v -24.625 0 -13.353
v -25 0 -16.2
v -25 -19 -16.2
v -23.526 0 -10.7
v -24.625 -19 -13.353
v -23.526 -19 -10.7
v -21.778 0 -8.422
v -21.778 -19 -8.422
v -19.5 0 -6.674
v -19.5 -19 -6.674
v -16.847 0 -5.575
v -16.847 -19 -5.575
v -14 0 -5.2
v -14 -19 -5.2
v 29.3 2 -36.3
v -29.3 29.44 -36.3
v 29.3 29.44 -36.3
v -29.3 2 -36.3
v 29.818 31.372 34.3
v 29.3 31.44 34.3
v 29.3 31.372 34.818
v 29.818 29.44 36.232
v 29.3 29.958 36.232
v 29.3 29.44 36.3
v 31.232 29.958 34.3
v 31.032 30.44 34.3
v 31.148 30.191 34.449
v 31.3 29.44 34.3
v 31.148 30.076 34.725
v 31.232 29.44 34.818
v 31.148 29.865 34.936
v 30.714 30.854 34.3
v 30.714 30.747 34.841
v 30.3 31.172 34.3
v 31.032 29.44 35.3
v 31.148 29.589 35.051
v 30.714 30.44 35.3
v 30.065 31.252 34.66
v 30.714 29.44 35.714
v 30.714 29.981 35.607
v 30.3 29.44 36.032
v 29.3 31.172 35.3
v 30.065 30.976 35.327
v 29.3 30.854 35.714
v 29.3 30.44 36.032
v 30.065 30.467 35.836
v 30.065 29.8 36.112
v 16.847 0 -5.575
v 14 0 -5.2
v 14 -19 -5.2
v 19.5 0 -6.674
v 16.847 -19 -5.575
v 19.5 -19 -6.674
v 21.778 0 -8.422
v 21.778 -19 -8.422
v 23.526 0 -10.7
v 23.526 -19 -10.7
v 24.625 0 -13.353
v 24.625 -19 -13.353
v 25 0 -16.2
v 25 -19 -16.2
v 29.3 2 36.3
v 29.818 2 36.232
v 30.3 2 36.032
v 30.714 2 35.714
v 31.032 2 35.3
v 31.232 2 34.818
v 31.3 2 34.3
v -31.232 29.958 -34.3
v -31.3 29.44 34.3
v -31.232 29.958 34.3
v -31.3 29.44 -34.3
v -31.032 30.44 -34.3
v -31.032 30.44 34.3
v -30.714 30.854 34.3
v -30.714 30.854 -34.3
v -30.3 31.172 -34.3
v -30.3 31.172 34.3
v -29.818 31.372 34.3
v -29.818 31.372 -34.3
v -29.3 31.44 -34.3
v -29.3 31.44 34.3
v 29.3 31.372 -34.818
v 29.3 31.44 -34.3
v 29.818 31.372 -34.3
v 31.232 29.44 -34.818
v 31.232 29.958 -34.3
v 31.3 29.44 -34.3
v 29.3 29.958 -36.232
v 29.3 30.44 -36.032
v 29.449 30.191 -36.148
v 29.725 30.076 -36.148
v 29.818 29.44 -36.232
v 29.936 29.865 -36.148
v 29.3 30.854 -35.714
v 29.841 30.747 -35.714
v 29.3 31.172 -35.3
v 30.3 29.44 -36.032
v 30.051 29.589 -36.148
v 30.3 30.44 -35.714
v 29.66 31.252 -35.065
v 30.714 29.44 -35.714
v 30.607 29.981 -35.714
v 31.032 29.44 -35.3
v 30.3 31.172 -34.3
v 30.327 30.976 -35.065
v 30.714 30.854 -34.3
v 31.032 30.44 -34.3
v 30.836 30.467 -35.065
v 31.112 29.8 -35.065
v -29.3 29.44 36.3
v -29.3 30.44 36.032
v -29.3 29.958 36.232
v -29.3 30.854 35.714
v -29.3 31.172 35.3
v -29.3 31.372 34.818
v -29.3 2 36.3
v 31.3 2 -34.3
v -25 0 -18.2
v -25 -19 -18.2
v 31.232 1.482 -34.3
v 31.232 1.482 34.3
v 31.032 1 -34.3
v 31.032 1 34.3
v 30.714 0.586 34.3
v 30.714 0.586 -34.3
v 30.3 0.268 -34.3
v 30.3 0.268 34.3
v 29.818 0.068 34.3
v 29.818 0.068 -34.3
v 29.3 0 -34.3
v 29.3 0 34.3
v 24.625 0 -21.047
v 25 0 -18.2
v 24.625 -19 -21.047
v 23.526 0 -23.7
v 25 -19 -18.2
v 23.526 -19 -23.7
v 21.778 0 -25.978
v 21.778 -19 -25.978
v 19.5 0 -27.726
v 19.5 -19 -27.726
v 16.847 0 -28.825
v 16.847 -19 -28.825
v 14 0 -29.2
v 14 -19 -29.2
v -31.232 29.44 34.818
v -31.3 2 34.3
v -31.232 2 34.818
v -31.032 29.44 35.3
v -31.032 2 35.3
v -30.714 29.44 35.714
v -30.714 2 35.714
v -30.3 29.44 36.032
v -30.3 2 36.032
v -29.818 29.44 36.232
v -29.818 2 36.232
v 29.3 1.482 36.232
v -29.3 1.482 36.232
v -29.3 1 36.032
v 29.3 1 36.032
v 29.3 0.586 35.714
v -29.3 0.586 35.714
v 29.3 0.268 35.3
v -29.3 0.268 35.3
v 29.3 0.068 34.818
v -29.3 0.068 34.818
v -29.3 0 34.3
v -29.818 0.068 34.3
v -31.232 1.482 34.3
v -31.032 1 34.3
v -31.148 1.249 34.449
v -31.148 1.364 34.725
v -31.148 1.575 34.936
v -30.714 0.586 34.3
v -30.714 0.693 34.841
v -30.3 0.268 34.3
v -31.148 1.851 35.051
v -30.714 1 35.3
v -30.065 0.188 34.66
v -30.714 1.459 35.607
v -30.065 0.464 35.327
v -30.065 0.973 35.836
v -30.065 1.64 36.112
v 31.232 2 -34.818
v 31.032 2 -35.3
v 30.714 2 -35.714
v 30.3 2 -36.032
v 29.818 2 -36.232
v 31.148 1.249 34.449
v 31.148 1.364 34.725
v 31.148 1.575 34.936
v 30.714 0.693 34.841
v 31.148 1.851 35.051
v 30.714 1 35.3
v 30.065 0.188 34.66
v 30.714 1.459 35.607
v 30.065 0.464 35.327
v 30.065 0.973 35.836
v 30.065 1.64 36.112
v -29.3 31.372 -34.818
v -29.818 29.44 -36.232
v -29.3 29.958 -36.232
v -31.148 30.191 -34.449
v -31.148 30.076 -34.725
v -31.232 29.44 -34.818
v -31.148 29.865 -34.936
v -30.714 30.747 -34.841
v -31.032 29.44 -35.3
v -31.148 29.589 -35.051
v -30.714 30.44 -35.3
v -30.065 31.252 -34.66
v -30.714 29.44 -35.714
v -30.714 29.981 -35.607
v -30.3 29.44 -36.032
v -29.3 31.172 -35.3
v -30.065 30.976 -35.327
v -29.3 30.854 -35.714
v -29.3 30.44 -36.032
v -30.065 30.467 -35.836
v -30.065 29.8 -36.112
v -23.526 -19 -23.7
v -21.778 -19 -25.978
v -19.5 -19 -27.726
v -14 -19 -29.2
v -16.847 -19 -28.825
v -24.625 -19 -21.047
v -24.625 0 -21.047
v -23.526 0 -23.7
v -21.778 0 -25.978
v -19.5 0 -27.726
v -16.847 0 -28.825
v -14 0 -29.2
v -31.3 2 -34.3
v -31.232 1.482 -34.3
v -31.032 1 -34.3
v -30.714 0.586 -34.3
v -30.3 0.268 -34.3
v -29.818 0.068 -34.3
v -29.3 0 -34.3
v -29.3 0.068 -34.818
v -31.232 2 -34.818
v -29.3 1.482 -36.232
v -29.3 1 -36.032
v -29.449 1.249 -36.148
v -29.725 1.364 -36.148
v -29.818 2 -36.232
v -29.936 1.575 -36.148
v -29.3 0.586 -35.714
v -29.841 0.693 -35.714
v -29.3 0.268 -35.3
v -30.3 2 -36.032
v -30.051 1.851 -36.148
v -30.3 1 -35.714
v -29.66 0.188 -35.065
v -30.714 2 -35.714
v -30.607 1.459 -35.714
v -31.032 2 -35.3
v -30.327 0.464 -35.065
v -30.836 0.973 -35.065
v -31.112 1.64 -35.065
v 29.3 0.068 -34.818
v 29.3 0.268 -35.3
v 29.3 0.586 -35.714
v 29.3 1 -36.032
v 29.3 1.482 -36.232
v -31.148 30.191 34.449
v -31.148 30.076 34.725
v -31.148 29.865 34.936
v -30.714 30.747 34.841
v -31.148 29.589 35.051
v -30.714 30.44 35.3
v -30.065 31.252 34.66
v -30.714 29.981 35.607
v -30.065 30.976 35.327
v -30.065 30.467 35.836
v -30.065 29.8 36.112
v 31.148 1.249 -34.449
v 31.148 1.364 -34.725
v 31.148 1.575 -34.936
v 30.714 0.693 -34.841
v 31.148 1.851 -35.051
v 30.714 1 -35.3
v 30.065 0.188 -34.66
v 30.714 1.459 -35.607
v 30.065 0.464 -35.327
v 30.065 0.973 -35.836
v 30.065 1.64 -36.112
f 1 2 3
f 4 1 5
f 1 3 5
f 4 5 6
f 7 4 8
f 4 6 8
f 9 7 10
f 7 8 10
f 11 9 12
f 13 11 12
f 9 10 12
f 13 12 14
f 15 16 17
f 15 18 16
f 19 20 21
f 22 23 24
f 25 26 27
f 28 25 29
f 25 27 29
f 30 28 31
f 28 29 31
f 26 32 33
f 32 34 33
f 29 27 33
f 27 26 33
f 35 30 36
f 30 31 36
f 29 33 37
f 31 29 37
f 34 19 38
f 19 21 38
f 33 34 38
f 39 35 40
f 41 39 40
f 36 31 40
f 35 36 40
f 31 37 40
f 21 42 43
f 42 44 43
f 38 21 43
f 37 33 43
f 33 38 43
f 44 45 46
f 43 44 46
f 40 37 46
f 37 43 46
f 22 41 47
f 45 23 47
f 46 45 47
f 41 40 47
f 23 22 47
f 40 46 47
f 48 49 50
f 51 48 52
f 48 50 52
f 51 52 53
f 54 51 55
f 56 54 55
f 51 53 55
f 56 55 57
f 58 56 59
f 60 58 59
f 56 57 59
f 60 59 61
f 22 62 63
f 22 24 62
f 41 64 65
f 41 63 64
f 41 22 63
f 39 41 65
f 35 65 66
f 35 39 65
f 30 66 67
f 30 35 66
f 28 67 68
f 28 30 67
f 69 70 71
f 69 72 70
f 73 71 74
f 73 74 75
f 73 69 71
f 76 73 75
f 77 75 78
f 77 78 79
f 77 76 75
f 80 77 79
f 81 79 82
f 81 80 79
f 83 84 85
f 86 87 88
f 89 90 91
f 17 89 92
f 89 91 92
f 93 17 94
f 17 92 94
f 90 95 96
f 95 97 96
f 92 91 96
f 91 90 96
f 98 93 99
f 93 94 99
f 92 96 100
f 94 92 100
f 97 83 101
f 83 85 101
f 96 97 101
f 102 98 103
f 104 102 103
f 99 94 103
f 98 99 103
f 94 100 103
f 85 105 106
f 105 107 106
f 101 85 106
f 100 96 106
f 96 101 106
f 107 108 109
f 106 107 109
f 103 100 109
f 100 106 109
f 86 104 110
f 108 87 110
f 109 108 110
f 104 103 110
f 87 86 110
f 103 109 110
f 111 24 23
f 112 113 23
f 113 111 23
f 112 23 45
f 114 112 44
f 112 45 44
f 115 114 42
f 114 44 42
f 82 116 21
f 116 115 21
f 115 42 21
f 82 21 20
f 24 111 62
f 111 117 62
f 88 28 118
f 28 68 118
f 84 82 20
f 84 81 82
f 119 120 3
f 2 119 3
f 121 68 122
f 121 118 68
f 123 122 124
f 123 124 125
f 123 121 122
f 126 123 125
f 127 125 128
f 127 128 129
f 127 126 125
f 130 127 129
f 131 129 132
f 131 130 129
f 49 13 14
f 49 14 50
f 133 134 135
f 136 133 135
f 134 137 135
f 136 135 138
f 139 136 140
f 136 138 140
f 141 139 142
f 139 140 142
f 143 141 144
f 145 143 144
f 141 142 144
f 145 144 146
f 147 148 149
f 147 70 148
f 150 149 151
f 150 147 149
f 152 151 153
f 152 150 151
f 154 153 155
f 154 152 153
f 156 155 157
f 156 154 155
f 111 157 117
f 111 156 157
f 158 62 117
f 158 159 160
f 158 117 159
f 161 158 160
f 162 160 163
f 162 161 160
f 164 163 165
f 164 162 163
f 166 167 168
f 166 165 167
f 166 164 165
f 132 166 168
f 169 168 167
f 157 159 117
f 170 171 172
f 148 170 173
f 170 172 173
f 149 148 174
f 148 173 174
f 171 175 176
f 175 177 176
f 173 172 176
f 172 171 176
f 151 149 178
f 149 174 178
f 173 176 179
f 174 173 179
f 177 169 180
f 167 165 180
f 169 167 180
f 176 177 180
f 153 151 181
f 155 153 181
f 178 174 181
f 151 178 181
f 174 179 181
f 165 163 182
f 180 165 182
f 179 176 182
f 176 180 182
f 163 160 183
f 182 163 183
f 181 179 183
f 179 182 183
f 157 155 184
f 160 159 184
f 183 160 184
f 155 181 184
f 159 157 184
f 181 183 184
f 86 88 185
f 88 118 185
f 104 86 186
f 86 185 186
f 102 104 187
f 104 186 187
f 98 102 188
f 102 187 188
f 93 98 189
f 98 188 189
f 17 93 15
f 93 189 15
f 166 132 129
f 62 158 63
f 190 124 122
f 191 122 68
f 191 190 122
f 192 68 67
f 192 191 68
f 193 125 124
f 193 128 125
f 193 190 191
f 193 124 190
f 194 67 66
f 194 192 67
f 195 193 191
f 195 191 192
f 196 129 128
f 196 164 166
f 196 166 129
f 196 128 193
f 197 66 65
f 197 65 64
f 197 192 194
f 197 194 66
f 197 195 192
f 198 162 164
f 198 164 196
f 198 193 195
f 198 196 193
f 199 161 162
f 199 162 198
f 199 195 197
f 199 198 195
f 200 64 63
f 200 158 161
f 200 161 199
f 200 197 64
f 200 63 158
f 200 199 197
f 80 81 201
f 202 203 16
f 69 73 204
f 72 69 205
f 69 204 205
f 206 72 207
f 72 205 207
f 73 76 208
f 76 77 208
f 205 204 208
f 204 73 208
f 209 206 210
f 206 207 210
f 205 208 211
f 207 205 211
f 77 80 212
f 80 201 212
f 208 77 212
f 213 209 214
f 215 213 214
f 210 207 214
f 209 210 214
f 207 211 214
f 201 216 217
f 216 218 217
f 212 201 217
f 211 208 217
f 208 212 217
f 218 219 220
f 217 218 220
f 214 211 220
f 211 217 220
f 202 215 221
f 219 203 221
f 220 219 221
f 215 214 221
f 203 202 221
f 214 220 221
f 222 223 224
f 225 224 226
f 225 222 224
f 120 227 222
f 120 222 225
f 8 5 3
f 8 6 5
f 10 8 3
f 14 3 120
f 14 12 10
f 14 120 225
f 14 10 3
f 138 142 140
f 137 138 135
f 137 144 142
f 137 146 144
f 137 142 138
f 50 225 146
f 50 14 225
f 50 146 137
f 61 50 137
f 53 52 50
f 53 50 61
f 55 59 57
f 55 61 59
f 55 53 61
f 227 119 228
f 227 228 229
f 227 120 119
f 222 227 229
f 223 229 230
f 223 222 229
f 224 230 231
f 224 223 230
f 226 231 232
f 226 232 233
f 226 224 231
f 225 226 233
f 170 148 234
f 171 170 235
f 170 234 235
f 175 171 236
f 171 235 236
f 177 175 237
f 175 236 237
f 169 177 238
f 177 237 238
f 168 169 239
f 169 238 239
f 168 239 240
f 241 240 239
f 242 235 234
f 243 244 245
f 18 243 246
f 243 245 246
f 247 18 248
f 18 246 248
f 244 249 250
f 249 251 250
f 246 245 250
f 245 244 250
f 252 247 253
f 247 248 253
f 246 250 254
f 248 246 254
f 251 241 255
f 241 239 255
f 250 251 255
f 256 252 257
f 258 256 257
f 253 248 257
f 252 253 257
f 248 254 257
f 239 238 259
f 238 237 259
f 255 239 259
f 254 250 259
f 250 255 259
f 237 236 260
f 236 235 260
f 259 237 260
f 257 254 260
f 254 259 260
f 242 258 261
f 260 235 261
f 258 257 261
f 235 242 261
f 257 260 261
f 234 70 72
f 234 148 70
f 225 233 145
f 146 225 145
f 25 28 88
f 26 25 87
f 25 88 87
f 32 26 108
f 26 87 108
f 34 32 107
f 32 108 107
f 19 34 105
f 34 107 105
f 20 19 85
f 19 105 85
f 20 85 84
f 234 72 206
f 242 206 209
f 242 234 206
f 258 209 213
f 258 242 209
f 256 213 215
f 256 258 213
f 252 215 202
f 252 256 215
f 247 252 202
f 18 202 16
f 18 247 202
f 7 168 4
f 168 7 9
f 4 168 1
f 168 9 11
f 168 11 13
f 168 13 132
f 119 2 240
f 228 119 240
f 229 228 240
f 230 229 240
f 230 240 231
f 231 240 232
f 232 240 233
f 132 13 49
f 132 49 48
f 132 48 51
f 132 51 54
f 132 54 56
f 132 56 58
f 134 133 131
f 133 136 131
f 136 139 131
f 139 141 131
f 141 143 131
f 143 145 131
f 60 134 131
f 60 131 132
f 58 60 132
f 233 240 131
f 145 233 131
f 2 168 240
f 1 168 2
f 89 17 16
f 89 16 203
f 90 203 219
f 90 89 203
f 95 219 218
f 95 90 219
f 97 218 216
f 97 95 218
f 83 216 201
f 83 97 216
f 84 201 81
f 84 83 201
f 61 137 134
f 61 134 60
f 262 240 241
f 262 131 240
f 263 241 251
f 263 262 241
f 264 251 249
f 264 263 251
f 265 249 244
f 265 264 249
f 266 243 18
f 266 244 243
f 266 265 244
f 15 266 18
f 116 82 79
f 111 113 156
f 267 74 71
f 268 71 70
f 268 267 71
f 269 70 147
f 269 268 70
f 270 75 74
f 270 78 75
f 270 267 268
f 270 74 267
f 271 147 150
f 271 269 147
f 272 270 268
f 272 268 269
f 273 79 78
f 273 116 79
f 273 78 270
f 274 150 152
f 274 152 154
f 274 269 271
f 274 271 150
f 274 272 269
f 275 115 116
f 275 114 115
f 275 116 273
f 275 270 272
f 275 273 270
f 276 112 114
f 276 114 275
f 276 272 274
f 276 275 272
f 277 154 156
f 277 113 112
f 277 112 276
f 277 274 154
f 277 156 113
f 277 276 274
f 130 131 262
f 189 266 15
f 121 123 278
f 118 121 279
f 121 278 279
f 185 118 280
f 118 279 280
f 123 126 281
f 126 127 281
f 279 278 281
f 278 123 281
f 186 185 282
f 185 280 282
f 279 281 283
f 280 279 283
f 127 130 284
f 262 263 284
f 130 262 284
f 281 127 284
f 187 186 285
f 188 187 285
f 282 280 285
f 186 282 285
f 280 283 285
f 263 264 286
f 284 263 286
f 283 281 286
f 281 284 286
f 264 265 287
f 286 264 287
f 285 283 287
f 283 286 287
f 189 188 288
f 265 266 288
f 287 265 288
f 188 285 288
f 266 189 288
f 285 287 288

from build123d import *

# Parameters (mm, degrees)
SKETCH1_W           = 62.6
SKETCH1_H           = 72.6
BOSS_EXTRUDE1_DEPTH = 24.14
SKETCH2_W           = 50
SKETCH2_H           = 24
BOSS_EXTRUDE2_DEPTH = 19
SKETCH3_W           = 62.6
SKETCH3_H           = 72.6
BOSS_EXTRUDE3_DEPTH = 7.3
FILLET1_R           = 2
FILLET2_R           = 11


with BuildPart() as part:
    # Sketch1 → Boss-Extrude1 (new body)
    with BuildSketch(Plane(origin=(0, 0, 0), x_dir=(1, 0, 0), z_dir=(0, 1, 0))):
        Rectangle(SKETCH1_W, SKETCH1_H)
    extrude(amount=BOSS_EXTRUDE1_DEPTH)

    # Sketch2 → Boss-Extrude2 (add)
    with BuildSketch(Plane.XZ):
        with Locations((0, -17.2)):
            Rectangle(SKETCH2_W, SKETCH2_H)
    extrude(amount=BOSS_EXTRUDE2_DEPTH)

    # Sketch3 → Boss-Extrude3 (add)
    with BuildSketch(Plane(origin=(0, 24.14, 0), x_dir=(1, 0, 0), z_dir=(0, 1, 0))):
        Rectangle(SKETCH3_W, SKETCH3_H)
    extrude(amount=BOSS_EXTRUDE3_DEPTH)

    # Fillet1
    fillet1_edges = [part.edges().sort_by_distance(p)[0] for p in [
        (0, 31.44, 36.3),
        (31.3, 31.44, 0),
        (0, 31.44, -36.3),
        (-31.3, 31.44, 0),
        (0, 0, 36.3),
        (-31.3, 0, 0),
        (0, 0, -36.3),
        (31.3, 0, 0),
        (31.3, 15.72, 36.3),
        (-31.3, 15.72, 36.3),
        (-31.3, 15.72, -36.3),
        (31.3, 15.72, -36.3),
    ]]
    fillet(fillet1_edges, radius=FILLET1_R)

    # Fillet2
    fillet2_edges = [part.edges().sort_by_distance(p)[0] for p in [
        (-25, -9.5, -5.2),
        (-25, -9.5, -29.2),
        (25, -9.5, -29.2),
        (25, -9.5, -5.2),
    ]]
    fillet(fillet2_edges, radius=FILLET2_R)


solid = part.part
